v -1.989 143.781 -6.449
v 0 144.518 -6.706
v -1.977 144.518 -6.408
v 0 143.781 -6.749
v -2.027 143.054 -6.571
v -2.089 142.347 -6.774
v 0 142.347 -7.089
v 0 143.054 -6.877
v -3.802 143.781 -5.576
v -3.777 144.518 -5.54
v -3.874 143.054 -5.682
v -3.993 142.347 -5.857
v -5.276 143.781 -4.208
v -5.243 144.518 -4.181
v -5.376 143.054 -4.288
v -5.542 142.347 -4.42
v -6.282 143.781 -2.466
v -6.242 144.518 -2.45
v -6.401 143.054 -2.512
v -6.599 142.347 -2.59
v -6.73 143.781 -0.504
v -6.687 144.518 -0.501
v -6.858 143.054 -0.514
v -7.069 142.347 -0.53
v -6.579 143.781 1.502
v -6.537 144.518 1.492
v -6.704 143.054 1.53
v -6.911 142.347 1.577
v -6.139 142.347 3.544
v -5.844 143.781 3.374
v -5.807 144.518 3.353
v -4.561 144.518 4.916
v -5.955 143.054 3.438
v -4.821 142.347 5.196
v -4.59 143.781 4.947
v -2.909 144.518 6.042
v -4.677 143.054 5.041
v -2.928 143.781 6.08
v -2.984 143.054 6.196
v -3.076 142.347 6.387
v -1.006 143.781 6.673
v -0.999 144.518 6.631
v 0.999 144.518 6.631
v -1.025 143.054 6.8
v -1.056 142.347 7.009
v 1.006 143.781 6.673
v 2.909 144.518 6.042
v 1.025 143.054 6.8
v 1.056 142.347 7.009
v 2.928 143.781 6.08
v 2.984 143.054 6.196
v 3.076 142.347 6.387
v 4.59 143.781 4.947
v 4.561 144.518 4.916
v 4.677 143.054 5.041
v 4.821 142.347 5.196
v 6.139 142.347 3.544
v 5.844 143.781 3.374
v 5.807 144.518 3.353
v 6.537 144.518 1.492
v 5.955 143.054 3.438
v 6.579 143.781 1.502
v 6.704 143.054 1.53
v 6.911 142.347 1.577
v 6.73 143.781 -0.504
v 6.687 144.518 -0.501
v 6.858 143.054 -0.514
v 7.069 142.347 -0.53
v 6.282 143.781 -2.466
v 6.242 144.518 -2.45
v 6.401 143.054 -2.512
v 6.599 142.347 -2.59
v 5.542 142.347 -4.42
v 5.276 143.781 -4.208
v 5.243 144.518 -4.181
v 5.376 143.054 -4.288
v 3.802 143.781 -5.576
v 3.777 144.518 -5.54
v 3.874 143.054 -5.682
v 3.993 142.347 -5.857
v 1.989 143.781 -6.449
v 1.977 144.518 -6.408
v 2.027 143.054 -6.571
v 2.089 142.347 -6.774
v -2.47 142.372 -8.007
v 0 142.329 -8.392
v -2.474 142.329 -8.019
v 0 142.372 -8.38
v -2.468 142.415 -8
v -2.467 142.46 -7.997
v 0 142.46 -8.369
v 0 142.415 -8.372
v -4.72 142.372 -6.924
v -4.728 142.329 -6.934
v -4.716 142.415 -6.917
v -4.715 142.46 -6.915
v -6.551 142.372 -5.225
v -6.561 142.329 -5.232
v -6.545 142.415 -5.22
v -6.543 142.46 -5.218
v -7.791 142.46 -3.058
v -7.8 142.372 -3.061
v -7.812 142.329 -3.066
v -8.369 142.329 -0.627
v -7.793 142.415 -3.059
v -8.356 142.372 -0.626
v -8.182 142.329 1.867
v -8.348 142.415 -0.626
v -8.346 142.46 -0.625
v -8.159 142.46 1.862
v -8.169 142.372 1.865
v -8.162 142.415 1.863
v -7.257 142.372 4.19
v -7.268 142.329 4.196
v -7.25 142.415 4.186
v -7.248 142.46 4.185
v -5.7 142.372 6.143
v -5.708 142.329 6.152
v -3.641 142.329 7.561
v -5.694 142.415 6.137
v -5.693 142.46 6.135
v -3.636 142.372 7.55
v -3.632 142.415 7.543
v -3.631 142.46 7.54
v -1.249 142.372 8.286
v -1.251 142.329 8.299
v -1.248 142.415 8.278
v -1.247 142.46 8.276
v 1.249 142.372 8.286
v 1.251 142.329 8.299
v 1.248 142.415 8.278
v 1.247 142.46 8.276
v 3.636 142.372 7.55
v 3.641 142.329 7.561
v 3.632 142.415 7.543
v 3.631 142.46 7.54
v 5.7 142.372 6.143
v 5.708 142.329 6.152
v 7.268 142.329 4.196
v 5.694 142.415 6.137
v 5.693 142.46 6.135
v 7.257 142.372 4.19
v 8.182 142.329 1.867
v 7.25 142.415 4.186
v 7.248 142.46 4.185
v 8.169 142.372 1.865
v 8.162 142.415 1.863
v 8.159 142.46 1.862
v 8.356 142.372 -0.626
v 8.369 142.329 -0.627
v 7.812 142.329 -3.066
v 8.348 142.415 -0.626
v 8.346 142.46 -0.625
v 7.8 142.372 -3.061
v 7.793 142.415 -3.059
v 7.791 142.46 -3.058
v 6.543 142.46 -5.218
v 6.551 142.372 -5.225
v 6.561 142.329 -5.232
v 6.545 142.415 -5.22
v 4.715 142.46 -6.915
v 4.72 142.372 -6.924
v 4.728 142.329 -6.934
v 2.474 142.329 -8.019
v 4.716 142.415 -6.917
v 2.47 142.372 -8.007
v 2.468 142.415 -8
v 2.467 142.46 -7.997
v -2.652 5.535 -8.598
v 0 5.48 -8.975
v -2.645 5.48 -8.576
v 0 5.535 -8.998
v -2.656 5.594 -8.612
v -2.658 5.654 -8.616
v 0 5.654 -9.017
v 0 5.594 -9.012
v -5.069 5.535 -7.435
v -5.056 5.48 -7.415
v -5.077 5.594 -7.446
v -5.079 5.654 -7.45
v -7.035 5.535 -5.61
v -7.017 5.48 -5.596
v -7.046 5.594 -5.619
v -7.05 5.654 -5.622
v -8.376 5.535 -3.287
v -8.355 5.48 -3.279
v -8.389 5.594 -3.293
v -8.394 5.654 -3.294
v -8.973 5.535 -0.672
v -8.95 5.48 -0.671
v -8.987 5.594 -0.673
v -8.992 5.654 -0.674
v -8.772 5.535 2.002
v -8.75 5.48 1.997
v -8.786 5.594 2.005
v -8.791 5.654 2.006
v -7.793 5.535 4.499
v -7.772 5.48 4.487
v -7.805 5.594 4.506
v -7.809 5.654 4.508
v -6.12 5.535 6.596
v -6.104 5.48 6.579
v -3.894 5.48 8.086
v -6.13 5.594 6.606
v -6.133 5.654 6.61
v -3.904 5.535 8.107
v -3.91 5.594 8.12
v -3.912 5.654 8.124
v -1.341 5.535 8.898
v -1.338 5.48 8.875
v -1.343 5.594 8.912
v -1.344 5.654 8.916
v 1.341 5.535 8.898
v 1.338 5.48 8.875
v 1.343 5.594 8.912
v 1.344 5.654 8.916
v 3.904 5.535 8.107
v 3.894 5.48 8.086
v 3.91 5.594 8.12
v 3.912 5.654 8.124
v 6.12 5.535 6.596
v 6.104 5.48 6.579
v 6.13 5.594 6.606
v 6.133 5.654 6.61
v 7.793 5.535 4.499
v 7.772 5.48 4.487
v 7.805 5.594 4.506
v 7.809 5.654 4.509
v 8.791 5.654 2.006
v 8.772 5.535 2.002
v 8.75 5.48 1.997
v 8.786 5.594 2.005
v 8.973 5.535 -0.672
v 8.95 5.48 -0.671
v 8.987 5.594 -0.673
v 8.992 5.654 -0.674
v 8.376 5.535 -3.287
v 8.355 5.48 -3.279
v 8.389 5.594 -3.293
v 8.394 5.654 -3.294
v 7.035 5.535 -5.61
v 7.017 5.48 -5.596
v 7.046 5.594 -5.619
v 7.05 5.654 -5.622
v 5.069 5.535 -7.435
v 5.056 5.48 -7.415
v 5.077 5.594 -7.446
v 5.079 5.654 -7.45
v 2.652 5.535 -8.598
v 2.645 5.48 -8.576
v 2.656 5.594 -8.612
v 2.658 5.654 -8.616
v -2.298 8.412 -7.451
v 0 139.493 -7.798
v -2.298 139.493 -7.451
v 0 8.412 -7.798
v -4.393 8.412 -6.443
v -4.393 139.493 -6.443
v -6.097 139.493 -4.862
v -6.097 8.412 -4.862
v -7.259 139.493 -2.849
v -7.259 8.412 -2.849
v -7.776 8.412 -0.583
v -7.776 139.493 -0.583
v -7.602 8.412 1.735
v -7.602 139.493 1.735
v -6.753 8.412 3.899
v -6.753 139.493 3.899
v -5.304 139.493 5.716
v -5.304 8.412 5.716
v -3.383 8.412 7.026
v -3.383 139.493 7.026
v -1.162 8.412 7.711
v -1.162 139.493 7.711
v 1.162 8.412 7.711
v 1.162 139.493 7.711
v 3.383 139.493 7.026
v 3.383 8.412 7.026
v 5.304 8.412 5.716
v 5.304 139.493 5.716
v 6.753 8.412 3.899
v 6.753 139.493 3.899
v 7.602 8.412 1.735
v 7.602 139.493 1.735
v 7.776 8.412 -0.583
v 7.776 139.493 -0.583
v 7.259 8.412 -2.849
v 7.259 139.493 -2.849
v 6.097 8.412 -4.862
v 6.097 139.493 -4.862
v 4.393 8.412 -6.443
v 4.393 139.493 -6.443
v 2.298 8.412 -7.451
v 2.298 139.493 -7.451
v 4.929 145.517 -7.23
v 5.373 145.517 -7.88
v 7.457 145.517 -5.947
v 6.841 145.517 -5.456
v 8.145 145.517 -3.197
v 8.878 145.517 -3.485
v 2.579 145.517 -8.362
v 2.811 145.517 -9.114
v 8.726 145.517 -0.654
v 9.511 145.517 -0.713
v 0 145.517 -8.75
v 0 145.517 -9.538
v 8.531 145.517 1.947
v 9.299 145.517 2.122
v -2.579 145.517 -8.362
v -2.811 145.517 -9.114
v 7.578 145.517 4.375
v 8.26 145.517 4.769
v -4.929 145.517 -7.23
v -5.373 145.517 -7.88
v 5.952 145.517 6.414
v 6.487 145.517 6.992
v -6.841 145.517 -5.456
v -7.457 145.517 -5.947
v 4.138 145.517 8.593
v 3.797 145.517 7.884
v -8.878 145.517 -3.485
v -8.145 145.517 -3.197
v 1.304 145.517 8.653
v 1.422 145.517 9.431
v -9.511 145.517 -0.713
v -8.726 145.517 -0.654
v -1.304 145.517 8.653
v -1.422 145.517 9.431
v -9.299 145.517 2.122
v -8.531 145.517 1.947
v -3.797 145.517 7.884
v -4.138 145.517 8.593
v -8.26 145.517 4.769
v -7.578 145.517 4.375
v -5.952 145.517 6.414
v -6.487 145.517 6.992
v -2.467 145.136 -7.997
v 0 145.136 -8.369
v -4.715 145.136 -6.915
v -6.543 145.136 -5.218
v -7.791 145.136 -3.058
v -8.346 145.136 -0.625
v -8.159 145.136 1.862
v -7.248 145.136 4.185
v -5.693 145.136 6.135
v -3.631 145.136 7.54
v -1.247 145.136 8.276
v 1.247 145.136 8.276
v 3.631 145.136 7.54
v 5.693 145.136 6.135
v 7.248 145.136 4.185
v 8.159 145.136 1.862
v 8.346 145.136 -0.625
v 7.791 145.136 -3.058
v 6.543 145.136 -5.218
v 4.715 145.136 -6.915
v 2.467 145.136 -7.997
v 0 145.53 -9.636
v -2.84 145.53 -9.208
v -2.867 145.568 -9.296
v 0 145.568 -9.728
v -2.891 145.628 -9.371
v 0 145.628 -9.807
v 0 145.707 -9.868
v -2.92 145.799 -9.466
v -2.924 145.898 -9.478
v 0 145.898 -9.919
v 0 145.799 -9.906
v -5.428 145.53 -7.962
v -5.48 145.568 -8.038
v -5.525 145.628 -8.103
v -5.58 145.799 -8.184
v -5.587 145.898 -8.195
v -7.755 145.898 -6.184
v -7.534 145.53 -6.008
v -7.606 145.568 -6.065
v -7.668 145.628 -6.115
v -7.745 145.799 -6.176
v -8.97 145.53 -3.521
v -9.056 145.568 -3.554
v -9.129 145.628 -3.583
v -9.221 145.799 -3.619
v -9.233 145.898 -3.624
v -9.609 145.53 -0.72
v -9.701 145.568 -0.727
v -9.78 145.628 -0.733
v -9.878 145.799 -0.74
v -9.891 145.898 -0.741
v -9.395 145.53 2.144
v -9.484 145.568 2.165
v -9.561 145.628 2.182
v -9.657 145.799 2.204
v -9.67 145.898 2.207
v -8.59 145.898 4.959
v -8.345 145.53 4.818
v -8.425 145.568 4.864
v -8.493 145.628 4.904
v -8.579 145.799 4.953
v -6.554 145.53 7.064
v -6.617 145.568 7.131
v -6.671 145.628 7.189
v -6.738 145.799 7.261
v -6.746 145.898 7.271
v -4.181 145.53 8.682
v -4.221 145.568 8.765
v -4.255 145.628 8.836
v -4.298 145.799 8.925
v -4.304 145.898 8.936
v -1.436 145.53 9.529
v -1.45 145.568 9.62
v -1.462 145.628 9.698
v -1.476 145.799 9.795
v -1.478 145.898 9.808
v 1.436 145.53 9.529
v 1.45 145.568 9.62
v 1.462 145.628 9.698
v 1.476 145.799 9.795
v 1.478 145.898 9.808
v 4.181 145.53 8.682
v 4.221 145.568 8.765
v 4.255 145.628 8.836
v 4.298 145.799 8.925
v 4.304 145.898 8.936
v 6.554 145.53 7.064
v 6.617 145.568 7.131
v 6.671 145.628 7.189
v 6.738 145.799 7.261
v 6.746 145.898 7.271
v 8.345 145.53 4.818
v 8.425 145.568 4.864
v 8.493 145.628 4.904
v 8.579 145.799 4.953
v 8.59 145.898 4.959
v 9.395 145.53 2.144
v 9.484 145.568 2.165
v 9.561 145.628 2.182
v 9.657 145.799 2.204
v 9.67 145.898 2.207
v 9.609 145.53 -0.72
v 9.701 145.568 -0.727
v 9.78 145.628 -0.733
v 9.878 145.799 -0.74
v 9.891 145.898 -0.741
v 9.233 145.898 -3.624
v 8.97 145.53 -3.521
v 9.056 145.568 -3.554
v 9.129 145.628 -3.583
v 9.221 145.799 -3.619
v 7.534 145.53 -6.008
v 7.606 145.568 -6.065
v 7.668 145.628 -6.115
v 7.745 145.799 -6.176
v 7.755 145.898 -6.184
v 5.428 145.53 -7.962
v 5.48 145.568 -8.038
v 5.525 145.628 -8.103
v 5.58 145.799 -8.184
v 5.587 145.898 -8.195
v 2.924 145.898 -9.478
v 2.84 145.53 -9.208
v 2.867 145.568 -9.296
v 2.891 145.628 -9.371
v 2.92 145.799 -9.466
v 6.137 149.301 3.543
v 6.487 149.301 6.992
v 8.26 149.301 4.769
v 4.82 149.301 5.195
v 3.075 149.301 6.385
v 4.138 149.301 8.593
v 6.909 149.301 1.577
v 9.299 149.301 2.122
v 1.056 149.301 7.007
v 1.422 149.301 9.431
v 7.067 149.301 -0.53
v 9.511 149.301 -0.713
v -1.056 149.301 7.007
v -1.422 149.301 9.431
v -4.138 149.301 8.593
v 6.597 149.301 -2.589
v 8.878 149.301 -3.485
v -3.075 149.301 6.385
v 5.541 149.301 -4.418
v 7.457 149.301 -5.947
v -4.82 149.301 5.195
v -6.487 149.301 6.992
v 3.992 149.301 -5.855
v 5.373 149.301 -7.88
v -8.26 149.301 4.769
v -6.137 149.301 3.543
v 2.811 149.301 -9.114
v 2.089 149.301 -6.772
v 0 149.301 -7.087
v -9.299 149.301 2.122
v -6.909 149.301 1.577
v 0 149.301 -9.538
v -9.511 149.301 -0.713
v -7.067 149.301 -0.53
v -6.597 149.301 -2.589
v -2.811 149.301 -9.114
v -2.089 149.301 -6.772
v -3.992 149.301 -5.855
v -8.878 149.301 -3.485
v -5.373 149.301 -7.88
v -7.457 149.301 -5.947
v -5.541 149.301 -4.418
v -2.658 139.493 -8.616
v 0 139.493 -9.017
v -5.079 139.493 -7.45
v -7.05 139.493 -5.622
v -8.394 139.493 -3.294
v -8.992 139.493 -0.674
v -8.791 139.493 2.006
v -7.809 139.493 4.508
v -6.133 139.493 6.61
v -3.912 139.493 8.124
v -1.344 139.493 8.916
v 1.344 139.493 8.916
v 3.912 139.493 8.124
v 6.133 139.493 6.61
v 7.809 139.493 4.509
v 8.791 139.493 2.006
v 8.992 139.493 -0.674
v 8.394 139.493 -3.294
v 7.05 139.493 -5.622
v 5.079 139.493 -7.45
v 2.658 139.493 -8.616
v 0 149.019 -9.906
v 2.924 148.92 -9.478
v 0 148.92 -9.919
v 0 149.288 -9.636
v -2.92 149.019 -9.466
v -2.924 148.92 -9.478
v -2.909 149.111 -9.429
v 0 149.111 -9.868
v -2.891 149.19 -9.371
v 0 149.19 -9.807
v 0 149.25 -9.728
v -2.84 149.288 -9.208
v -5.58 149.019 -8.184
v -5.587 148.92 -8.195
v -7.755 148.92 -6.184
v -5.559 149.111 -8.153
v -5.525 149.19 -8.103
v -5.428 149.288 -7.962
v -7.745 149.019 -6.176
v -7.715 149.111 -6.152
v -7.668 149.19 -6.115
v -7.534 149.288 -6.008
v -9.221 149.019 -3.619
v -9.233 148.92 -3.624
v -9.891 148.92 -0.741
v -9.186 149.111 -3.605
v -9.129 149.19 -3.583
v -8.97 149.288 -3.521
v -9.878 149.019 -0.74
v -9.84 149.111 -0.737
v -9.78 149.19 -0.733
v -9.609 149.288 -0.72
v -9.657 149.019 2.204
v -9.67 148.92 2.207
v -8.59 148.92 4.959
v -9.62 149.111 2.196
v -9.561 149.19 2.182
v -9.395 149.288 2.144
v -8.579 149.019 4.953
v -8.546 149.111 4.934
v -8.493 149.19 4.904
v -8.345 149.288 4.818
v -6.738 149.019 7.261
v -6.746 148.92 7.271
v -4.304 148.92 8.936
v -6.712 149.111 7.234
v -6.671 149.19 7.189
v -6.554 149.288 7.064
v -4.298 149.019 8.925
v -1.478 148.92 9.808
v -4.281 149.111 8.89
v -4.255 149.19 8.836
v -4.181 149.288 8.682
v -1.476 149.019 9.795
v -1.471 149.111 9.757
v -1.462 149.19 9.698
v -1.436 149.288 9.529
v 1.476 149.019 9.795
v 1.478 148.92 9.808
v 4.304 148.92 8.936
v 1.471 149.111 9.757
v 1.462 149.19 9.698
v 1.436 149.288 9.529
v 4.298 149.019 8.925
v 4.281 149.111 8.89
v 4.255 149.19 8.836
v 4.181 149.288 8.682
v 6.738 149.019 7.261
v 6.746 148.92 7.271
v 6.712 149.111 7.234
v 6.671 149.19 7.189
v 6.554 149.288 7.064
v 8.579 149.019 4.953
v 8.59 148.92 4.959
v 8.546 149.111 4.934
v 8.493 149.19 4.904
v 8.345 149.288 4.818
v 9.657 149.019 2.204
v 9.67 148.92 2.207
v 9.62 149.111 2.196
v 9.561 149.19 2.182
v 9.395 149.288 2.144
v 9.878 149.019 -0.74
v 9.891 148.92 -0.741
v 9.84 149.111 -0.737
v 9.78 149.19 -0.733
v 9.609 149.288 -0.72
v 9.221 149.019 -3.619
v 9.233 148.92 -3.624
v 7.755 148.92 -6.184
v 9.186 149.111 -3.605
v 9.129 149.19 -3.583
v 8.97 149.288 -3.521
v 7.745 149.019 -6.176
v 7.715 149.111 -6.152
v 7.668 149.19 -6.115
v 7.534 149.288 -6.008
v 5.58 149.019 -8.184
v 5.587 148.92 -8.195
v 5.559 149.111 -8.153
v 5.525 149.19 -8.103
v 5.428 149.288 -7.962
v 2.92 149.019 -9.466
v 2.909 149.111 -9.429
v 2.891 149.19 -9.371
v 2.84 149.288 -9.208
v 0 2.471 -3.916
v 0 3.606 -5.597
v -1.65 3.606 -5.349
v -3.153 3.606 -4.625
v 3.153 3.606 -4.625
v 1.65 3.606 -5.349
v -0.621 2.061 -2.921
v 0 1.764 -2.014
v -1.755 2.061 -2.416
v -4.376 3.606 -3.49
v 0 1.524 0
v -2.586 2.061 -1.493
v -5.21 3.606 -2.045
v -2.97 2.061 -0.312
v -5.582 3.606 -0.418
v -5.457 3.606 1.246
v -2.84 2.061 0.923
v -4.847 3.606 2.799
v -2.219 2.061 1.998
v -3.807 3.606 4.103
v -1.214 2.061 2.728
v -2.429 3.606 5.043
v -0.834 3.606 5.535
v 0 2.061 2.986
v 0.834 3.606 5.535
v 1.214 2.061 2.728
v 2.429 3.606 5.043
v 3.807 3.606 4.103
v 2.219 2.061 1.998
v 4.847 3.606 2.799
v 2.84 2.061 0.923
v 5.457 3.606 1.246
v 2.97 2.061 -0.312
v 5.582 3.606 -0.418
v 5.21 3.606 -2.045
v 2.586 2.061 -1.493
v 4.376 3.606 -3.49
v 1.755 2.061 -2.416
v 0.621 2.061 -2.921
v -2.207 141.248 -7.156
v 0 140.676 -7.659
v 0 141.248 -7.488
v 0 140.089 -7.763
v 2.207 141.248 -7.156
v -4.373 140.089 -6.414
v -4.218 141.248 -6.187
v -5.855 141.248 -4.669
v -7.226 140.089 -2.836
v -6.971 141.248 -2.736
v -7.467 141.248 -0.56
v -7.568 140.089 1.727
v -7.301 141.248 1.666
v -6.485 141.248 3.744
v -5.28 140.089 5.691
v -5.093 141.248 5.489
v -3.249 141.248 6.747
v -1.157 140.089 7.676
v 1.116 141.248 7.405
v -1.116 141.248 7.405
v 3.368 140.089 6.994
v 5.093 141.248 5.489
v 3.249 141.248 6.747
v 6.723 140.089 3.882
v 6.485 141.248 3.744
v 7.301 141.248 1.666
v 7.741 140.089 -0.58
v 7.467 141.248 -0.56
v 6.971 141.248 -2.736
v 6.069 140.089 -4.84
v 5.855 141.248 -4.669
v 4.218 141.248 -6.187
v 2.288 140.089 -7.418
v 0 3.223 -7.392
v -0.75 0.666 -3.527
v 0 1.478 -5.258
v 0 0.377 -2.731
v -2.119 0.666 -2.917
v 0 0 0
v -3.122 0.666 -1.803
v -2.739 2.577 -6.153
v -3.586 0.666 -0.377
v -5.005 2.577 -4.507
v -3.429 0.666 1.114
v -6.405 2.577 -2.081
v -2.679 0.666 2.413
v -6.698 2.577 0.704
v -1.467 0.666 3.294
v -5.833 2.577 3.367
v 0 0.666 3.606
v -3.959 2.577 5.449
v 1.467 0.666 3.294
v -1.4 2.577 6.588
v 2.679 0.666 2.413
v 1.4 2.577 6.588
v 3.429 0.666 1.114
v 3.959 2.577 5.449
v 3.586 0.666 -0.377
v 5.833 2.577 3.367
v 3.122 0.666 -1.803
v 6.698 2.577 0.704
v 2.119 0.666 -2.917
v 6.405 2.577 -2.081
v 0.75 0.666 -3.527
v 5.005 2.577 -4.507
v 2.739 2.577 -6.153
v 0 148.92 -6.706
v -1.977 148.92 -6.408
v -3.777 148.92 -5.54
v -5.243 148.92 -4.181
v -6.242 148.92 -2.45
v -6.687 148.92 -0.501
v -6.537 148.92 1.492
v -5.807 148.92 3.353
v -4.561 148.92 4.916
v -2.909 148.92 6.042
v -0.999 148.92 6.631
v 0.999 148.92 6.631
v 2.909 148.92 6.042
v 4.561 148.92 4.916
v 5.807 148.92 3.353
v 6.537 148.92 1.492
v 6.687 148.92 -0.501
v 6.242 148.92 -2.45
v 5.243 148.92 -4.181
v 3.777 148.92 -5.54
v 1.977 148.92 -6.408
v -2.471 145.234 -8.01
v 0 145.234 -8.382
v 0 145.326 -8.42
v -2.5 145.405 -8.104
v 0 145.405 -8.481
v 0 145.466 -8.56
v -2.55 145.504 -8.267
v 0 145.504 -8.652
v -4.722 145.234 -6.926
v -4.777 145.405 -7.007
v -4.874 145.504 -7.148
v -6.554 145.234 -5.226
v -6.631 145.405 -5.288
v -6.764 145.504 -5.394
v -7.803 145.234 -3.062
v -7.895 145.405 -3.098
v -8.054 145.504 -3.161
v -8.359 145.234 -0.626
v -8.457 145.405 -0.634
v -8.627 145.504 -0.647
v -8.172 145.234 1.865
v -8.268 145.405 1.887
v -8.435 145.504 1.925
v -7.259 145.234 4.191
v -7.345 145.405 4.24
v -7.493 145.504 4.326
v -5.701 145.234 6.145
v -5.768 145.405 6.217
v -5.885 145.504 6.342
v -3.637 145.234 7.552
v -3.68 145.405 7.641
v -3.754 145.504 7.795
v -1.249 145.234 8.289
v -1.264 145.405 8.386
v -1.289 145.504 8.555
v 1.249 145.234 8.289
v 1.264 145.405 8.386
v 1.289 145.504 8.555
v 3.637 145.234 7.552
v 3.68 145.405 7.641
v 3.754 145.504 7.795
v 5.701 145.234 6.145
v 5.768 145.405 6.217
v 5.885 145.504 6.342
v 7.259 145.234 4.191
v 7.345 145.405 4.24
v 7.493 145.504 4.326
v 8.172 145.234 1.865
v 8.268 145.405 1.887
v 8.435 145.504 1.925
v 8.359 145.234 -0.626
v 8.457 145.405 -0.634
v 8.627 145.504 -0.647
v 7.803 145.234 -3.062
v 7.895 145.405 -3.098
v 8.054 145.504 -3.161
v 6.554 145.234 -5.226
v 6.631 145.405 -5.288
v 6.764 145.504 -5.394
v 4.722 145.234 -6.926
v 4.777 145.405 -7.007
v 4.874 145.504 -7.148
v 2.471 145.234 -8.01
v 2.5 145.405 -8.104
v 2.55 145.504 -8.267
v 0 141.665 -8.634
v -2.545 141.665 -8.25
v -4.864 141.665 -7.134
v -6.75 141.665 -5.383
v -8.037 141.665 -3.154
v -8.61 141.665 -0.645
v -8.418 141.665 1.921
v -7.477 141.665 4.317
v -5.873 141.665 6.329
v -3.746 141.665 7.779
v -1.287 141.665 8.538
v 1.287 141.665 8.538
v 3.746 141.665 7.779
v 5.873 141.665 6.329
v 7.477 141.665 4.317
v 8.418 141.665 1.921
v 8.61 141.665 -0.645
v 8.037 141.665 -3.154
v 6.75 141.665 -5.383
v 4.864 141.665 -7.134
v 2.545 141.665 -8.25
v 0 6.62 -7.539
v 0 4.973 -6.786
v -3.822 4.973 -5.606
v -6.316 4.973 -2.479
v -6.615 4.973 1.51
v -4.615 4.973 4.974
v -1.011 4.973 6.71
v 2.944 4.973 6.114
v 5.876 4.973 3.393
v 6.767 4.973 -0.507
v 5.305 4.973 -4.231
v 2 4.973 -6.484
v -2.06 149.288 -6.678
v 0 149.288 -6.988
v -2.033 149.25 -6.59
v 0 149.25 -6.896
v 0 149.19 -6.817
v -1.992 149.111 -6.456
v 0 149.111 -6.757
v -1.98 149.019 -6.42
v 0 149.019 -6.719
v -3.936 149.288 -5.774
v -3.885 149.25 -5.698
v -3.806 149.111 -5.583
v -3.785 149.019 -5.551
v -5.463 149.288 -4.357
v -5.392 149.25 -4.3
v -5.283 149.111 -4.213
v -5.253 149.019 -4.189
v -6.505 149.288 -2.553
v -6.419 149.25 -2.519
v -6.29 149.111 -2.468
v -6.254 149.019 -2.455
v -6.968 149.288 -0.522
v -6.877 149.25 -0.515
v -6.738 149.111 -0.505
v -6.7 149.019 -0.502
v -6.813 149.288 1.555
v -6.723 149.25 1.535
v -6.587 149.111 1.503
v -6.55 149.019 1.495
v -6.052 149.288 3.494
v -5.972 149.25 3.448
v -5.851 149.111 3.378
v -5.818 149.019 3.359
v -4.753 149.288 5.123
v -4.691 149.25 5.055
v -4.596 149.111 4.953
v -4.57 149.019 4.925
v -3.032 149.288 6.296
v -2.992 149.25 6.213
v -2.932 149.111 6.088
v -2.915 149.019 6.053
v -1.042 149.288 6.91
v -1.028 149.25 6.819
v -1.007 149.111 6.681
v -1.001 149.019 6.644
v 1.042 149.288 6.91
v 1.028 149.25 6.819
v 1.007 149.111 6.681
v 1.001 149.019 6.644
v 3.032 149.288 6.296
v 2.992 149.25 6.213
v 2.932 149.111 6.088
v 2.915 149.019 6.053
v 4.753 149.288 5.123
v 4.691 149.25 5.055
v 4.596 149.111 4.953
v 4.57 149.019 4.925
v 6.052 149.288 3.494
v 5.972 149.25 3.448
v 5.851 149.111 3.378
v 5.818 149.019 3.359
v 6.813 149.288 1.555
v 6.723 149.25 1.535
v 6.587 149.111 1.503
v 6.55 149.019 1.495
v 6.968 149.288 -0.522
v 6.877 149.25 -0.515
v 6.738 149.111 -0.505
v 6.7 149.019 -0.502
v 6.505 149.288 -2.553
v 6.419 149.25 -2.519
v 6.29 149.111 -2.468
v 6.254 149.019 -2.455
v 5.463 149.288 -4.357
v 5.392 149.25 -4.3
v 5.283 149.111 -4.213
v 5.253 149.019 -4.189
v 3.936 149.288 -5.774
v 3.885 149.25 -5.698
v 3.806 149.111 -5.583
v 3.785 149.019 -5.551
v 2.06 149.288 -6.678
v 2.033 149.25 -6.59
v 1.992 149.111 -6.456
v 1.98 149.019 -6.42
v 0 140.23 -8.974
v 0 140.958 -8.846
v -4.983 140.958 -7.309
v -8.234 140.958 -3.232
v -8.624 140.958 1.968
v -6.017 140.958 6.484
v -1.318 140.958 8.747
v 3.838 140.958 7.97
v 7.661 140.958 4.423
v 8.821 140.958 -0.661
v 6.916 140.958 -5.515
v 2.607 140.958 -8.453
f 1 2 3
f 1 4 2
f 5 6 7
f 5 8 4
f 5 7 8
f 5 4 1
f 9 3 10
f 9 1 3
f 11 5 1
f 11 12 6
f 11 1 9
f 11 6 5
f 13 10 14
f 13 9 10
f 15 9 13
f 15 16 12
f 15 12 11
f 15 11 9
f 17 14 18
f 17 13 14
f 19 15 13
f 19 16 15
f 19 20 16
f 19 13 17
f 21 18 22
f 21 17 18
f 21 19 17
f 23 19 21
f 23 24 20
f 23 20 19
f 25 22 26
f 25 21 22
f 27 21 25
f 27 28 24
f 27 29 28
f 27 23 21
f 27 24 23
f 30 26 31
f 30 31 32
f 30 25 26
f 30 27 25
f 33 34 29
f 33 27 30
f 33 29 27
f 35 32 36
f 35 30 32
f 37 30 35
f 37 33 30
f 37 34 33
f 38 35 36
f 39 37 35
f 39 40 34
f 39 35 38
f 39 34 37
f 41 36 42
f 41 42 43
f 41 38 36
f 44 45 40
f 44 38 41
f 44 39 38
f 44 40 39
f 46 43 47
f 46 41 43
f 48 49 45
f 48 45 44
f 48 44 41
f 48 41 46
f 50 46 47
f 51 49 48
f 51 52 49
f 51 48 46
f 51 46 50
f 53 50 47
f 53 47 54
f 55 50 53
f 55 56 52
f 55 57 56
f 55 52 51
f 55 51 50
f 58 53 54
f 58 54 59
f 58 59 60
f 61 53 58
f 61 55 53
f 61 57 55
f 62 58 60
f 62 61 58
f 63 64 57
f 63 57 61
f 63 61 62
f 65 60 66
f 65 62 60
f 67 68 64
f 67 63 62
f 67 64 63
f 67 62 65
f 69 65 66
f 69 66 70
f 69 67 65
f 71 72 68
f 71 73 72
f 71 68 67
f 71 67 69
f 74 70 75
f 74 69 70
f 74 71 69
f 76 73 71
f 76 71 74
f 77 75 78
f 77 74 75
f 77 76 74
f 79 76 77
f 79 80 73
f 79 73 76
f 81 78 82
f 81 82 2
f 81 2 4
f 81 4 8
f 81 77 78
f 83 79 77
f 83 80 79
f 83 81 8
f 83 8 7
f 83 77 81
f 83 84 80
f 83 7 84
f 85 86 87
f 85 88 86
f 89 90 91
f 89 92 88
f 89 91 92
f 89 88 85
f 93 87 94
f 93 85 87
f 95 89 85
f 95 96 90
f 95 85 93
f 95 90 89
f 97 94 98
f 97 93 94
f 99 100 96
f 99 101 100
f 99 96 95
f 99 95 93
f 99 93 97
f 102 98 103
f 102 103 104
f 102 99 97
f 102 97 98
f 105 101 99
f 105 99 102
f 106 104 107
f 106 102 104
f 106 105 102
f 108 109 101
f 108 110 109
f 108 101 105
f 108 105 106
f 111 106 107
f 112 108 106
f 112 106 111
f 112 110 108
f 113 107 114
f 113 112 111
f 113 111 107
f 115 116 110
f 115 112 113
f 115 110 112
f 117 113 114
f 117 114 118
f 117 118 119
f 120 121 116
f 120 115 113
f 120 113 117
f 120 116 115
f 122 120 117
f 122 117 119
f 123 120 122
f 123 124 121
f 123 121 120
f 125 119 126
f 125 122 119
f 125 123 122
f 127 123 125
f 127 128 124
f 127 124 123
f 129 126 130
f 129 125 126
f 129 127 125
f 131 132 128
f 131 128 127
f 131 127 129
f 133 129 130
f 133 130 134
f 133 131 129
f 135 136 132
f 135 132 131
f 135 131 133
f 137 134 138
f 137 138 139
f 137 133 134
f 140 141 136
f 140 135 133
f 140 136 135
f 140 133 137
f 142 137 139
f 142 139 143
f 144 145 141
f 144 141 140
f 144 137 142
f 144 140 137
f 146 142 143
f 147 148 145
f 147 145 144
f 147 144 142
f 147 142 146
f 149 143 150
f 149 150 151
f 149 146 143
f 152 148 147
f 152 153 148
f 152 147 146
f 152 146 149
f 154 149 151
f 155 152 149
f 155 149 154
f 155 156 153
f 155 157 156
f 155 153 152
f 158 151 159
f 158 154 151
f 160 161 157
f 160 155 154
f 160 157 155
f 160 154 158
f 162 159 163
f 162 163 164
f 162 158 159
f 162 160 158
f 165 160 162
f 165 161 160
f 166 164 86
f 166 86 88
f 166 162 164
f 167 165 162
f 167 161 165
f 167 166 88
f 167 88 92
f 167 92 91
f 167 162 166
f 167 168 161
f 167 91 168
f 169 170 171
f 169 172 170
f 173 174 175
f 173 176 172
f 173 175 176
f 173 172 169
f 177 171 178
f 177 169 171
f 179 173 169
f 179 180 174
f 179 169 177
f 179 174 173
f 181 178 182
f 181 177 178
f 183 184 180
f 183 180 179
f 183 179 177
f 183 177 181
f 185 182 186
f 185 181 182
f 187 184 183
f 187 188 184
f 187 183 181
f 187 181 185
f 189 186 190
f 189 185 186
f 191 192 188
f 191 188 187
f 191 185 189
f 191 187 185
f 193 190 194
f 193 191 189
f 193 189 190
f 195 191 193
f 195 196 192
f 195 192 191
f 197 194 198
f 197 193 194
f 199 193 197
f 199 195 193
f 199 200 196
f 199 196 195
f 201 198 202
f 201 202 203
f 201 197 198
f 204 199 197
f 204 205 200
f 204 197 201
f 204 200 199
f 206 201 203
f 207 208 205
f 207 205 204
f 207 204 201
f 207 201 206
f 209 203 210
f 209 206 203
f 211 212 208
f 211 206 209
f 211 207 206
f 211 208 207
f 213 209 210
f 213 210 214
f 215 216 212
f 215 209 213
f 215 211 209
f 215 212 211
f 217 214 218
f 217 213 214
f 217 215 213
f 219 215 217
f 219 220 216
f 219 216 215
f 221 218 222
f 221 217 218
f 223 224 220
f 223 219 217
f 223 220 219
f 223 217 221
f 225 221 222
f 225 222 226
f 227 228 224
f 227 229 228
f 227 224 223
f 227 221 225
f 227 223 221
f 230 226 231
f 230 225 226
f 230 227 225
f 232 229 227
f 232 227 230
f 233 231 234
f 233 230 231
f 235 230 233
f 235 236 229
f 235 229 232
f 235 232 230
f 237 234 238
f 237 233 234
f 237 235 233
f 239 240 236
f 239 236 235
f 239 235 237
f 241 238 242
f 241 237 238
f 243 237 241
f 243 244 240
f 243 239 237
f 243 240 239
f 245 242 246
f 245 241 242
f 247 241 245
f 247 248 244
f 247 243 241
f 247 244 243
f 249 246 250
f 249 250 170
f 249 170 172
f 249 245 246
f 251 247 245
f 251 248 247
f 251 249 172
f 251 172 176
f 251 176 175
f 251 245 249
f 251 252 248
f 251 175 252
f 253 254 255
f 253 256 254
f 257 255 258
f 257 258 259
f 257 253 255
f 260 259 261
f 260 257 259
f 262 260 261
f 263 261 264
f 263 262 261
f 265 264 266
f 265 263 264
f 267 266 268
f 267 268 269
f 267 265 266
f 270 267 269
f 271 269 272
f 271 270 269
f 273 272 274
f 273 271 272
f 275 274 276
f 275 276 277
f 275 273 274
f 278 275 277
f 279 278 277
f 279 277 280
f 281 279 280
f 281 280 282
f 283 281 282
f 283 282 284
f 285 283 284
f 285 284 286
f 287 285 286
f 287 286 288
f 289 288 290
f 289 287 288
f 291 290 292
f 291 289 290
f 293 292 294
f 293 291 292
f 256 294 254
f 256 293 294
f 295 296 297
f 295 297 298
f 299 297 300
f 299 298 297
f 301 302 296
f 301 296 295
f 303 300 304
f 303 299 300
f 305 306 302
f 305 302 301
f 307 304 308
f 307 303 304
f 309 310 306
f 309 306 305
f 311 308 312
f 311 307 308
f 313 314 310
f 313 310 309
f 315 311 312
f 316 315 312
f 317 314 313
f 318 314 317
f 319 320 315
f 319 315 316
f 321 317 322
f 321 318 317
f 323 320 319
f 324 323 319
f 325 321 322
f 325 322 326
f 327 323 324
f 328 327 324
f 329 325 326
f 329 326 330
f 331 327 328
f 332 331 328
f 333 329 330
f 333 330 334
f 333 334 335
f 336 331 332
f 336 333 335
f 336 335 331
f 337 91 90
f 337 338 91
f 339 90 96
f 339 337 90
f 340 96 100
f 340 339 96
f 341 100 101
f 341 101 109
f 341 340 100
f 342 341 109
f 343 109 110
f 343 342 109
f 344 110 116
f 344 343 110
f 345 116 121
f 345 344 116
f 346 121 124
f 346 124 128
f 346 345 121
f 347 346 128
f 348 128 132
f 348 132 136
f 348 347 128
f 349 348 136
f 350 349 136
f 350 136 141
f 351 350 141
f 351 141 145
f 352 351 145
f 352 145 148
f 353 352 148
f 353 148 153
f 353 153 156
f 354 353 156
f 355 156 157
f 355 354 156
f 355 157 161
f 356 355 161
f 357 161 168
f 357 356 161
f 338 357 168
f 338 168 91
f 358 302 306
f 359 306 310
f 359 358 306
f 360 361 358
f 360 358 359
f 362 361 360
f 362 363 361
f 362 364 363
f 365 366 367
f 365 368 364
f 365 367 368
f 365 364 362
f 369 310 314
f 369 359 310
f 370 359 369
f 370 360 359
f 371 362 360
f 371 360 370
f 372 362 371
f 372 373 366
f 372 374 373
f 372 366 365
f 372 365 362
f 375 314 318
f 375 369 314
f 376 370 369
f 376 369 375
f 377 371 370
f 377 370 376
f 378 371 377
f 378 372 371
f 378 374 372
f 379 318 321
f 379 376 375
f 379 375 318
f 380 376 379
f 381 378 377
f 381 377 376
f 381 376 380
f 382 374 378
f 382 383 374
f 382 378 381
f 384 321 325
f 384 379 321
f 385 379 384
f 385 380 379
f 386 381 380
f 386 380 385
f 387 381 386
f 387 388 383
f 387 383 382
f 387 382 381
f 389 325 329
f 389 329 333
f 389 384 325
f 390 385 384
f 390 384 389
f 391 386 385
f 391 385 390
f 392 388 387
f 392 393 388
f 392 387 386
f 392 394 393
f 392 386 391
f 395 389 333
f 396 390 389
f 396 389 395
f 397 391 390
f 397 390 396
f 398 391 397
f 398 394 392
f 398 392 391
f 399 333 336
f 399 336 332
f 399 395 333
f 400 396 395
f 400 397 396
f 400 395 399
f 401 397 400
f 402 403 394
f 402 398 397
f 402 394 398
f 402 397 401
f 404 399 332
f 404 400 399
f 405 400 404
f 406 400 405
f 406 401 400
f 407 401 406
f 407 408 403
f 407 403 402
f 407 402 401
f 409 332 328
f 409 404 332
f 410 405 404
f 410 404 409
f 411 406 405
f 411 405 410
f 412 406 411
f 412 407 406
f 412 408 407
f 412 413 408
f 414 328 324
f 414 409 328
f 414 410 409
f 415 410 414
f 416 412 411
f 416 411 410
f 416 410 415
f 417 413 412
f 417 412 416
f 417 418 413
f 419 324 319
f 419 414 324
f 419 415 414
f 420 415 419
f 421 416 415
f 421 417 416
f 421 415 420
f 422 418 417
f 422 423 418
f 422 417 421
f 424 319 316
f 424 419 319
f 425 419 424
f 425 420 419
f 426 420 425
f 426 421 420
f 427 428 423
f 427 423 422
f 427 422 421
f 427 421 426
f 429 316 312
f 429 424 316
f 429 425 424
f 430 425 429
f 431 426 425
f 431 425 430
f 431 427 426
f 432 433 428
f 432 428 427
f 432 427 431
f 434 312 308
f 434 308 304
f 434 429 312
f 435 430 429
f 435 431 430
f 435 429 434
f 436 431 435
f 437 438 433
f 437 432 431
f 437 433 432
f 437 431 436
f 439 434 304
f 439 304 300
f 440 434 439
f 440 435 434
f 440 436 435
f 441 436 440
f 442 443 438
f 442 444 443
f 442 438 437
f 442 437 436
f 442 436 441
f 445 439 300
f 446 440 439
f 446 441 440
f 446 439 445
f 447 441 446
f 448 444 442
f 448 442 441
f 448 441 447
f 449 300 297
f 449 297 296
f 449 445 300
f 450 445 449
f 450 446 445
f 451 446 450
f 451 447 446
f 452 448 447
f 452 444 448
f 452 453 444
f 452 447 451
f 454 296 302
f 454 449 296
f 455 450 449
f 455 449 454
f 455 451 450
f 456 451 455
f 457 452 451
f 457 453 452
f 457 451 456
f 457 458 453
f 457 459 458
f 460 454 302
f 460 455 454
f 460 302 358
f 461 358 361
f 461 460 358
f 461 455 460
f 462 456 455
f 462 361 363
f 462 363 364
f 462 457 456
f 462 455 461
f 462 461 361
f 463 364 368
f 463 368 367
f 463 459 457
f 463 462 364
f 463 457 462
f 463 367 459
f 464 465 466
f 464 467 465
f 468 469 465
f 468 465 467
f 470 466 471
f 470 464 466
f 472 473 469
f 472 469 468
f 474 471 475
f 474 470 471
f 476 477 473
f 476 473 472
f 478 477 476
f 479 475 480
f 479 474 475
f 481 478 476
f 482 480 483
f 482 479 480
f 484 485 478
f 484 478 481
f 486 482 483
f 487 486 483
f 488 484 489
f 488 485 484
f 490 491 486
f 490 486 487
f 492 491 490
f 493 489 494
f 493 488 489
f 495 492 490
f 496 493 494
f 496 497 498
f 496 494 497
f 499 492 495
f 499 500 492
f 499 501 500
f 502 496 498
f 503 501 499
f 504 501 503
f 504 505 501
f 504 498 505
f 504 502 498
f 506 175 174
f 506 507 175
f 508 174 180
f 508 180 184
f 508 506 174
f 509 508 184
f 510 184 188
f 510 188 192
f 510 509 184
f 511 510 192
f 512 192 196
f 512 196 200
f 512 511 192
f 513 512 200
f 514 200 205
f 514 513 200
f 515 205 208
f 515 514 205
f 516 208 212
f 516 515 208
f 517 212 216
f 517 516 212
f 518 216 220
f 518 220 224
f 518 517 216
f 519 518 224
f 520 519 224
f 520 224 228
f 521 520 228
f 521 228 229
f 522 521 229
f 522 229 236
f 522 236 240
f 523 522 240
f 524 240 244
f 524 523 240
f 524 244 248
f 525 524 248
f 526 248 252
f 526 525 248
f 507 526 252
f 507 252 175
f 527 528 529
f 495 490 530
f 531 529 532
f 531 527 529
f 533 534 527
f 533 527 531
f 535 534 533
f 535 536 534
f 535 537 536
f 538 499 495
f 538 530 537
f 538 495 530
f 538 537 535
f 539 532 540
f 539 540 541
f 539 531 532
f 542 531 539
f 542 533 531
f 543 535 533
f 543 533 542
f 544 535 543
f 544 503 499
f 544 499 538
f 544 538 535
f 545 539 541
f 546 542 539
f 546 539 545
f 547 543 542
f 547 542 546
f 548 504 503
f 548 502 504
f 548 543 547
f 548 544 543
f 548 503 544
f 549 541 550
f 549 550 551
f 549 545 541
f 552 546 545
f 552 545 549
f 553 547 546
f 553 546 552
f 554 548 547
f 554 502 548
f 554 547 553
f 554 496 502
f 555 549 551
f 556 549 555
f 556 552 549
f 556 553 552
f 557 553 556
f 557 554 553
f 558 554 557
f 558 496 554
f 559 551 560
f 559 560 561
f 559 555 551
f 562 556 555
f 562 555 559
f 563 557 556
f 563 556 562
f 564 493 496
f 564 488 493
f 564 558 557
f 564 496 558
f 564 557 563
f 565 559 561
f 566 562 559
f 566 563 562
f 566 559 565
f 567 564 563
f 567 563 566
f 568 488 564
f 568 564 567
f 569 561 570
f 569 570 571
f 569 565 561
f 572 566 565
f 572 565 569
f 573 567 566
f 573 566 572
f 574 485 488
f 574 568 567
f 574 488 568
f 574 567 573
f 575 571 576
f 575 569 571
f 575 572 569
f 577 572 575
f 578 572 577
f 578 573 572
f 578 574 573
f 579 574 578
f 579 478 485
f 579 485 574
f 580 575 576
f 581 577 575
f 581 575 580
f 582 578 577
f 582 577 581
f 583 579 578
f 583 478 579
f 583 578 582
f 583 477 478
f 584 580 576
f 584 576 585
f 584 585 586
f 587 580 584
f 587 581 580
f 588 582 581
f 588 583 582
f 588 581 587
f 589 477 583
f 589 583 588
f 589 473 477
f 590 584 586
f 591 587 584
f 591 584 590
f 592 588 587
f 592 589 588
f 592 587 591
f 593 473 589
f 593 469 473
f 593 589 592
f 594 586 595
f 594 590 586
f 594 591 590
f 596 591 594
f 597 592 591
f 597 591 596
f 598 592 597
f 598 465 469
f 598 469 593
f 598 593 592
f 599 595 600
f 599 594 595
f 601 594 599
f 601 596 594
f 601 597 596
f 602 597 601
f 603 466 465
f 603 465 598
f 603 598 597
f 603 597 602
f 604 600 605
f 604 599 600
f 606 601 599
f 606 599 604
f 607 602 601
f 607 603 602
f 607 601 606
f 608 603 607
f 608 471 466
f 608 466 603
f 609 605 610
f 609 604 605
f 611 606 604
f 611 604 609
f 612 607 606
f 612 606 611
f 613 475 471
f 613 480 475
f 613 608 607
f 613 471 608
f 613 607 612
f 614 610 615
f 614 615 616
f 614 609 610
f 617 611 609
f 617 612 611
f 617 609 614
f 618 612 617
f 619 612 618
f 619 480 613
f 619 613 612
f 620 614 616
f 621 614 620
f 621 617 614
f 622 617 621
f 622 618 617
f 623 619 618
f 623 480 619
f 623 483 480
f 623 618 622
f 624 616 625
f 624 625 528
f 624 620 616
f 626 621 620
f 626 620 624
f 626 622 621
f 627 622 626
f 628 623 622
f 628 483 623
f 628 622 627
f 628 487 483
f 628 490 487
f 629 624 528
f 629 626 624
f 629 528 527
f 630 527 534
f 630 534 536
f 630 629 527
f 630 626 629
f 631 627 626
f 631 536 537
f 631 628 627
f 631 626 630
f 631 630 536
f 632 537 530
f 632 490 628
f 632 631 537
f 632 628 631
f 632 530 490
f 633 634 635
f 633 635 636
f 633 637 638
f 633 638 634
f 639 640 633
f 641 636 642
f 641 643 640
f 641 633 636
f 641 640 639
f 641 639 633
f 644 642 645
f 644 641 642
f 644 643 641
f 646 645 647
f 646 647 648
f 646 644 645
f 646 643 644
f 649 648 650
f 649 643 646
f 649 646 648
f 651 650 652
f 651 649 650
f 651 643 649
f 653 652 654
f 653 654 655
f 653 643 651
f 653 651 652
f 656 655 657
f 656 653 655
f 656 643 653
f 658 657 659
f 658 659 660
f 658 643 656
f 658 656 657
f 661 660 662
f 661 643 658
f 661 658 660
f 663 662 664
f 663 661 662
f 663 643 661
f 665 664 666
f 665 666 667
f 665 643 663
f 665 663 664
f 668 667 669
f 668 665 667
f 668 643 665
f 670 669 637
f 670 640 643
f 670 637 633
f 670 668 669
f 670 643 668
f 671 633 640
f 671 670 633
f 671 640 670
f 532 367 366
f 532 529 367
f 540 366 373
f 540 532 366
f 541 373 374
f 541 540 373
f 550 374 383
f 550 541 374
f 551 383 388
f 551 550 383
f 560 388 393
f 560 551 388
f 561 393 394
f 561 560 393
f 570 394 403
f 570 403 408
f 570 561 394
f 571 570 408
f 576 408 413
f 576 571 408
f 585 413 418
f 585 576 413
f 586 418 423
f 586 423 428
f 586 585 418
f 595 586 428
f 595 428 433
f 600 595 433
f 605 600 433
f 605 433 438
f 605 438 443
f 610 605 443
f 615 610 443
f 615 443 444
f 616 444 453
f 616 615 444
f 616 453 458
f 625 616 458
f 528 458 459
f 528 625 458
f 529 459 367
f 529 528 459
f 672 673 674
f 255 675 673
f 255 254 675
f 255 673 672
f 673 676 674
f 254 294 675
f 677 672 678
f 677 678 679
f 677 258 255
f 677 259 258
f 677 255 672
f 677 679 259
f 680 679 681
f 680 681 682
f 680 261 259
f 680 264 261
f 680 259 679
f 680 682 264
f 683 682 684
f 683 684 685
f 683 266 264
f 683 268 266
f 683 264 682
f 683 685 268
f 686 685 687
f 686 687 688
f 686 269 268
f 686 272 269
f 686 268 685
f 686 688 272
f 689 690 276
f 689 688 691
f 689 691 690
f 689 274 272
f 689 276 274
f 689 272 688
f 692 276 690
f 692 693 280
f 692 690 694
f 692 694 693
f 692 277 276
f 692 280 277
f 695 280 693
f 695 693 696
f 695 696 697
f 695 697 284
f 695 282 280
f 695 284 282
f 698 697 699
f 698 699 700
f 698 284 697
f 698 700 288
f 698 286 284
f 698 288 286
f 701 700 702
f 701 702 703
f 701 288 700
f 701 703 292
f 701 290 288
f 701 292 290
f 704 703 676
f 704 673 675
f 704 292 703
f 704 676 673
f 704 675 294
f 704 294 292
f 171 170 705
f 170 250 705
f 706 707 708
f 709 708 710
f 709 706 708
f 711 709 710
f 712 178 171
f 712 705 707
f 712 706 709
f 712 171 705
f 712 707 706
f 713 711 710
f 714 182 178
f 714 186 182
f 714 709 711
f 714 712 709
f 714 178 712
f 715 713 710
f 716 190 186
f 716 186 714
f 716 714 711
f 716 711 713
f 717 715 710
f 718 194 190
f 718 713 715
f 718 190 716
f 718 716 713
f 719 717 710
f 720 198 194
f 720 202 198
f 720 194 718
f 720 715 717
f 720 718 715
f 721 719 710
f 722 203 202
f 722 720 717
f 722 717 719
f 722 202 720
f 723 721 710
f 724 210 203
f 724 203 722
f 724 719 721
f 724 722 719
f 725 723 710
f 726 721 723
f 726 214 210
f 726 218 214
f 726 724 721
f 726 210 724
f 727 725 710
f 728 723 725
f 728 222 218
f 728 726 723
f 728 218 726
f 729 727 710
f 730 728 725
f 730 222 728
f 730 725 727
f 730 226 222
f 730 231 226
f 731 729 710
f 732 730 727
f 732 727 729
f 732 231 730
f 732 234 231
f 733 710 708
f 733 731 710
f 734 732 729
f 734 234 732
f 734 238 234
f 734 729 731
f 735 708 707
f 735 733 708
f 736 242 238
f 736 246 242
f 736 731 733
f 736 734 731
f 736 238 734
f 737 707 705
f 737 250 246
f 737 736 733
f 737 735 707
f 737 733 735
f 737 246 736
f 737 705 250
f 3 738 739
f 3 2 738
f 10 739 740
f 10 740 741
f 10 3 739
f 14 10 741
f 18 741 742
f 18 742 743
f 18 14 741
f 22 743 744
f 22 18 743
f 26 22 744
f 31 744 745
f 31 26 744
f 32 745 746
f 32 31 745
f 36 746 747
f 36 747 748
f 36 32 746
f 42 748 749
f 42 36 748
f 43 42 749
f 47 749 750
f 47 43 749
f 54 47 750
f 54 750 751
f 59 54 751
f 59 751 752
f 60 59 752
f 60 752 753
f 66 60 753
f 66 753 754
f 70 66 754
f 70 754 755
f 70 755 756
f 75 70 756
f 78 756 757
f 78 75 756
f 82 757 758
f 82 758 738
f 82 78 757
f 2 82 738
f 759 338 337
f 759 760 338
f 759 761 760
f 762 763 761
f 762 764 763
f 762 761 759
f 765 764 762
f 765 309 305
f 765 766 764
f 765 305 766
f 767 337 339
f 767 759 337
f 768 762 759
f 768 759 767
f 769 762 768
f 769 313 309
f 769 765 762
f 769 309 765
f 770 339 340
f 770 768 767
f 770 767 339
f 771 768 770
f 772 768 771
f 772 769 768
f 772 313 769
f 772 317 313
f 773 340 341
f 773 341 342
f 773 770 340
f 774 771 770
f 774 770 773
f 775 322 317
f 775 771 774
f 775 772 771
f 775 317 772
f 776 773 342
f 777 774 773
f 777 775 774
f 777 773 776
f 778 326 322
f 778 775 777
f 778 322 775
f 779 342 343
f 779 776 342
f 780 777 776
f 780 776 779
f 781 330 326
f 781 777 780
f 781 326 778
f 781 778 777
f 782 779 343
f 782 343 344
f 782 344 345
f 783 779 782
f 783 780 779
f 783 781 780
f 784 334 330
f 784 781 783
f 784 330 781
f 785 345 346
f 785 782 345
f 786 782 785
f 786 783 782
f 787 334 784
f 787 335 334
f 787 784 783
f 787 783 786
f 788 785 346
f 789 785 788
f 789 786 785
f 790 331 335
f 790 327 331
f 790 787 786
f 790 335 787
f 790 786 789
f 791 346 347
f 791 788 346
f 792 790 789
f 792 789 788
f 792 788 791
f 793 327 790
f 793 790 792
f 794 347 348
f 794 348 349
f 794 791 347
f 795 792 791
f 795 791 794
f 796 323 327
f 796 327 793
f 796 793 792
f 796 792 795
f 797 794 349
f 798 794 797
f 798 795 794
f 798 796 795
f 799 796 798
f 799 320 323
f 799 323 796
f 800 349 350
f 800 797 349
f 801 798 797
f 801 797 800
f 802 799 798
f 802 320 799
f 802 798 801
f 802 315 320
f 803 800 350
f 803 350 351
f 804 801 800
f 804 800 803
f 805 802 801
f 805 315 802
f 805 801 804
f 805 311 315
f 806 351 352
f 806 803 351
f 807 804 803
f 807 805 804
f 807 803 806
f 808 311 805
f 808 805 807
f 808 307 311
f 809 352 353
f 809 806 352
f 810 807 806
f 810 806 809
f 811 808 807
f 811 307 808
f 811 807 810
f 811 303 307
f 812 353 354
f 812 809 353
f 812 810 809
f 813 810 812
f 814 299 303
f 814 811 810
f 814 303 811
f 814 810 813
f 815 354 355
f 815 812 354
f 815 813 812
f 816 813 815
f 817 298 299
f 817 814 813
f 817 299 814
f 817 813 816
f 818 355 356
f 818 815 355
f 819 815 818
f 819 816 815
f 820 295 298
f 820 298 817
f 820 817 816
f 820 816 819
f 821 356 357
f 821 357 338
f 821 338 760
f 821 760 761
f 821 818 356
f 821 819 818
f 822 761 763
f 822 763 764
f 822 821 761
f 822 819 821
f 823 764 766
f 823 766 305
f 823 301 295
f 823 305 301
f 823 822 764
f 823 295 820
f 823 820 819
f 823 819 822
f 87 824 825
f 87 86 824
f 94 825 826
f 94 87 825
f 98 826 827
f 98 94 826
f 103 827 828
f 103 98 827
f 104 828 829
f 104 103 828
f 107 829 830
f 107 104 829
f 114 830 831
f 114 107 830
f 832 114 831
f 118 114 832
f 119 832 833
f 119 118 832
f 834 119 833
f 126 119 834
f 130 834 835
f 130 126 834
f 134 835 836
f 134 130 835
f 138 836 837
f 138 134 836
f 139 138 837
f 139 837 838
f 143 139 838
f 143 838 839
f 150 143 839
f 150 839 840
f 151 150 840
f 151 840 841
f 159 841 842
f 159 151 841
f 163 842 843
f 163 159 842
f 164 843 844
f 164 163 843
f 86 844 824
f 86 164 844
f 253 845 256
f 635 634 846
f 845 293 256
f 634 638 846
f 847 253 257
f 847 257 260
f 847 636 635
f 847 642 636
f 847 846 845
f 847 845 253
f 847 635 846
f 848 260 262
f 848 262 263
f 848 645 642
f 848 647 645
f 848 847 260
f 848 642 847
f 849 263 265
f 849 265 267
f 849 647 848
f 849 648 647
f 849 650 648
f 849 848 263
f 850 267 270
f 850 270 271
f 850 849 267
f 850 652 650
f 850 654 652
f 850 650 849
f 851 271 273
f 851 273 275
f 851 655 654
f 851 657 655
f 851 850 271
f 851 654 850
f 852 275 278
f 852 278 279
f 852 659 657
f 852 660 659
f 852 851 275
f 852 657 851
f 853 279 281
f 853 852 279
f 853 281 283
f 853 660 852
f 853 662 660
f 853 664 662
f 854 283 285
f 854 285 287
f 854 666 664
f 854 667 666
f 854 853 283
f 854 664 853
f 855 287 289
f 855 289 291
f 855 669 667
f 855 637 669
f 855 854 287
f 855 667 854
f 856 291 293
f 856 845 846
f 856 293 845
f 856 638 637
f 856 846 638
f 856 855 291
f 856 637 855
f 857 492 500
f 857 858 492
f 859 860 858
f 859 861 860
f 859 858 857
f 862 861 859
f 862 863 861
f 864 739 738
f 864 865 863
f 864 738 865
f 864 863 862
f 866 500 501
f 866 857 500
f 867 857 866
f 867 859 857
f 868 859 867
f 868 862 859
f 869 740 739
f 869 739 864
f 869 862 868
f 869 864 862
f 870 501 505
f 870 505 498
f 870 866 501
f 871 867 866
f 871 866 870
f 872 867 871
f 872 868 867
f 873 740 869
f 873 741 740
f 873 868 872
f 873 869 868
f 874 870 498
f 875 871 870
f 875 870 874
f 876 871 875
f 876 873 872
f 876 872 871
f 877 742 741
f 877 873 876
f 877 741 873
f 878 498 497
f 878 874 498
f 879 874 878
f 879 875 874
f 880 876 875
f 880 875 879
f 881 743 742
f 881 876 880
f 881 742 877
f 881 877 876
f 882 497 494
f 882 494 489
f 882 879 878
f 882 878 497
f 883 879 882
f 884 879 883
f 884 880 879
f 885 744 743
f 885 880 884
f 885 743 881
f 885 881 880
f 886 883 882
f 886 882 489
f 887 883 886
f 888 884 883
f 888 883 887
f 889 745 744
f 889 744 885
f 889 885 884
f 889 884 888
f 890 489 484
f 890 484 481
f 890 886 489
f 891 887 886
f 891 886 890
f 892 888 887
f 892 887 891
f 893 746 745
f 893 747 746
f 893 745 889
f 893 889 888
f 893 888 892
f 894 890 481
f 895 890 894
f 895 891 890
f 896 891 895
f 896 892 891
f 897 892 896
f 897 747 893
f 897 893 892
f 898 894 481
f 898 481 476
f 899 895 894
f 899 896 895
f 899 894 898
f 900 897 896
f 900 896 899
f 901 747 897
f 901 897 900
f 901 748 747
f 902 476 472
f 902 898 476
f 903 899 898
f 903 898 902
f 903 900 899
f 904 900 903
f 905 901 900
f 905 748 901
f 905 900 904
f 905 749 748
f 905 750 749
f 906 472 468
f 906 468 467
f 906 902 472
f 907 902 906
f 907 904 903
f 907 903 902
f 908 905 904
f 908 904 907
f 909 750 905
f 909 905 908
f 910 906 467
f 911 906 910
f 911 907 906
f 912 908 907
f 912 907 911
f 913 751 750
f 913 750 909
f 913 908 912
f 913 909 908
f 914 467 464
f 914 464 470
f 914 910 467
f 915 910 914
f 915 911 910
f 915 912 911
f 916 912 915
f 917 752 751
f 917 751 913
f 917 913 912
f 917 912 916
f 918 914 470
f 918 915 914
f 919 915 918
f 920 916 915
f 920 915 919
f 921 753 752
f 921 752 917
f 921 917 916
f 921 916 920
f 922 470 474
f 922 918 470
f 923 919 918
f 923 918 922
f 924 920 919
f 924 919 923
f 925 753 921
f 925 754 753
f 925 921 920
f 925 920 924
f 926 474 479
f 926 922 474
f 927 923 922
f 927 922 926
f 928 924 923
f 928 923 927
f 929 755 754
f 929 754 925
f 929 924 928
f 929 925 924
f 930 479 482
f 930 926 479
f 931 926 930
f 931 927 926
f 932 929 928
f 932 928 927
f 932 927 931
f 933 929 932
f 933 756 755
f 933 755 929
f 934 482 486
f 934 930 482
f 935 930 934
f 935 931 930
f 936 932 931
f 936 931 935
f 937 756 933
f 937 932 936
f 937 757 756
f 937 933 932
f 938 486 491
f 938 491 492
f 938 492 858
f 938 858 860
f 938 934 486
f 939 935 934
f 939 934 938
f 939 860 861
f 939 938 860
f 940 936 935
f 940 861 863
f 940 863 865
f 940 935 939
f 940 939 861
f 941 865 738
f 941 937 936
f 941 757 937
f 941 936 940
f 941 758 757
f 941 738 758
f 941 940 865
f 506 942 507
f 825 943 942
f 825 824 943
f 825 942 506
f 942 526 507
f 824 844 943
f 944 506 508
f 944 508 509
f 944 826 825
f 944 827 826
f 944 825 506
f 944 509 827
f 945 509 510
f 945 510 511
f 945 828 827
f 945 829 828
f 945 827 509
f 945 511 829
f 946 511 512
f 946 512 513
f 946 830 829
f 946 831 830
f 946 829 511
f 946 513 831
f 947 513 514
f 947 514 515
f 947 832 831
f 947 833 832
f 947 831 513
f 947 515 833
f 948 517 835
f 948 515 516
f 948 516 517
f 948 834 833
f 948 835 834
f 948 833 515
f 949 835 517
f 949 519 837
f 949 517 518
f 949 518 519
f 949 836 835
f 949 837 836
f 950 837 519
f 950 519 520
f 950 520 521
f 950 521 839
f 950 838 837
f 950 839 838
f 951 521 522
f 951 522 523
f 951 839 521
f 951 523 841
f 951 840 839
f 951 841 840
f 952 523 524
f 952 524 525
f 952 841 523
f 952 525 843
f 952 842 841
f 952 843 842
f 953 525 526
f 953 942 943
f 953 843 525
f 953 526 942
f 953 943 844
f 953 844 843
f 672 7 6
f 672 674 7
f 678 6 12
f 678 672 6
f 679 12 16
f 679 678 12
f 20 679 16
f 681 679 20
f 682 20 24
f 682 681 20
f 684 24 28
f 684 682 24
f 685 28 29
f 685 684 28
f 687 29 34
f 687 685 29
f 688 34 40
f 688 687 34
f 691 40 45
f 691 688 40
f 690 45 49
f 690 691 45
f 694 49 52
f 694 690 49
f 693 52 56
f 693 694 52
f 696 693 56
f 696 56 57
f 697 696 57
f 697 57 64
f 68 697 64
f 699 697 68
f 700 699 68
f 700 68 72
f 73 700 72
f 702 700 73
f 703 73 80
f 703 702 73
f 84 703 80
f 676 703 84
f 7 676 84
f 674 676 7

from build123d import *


with BuildPart() as part:
    # Sketch1 → Revolve1 (revolve)
    with BuildSketch(Plane.XY, mode=Mode.PRIVATE) as revolve1_sk:
        with BuildLine():
            Line((-9.017, 5.653790228), (-9.017, 139.493182548))
            ThreePointArc((-9.017, 139.493182548), (-8.920529232, 140.595848476), (-8.634048142, 141.665010458))
            Line((-8.634048142, 141.665010458), (-8.392277111, 142.329270905))
            ThreePointArc((-8.392277111, 142.329270905), (-8.375088246, 142.393420624), (-8.3693, 142.45958058))
            Line((-8.3693, 142.45958058), (-8.3693, 145.1356))
            ThreePointArc((-8.3693, 145.1356), (-8.480892316, 145.405007684), (-8.7503, 145.5166))
            Line((-8.7503, 145.5166), (-9.5377, 145.5166))
            ThreePointArc((-9.5377, 145.5166), (-9.807107684, 145.628192316), (-9.9187, 145.8976))
            Line((-9.9187, 145.8976), (-9.9187, 148.9202))
            ThreePointArc((-9.9187, 148.9202), (-9.807107684, 149.189607684), (-9.5377, 149.3012))
            Line((-9.5377, 149.3012), (-7.0866, 149.3012))
            ThreePointArc((-7.0866, 149.3012), (-6.817192316, 149.189607684), (-6.7056, 148.9202))
            Line((-6.7056, 148.9202), (-6.7056, 144.518352186))
            ThreePointArc((-6.7056, 144.518352186), (-6.802070768, 143.415686257), (-7.088551858, 142.346524275))
            Line((-7.088551858, 142.346524275), (-7.488374899, 141.248019499))
            ThreePointArc((-7.488374899, 141.248019499), (-7.719851619, 140.384136618), (-7.7978, 139.493182548))
            Line((-7.7978, 139.493182548), (-7.7978, 8.412472236))
            ThreePointArc((-7.7978, 8.412472236), (-7.221513837, 5.769230188), (-5.597255583, 3.605756271))
            ThreePointArc((-5.597255583, 3.605756271), (-2.985924448, 2.061290242), (0, 1.524))
            Line((0, 1.524), (0, 0))
            ThreePointArc((0, 0), (-5.257761417, 1.478213913), (-8.974907392, 5.479713293))
            ThreePointArc((-8.974907392, 5.479713293), (-9.006327366, 5.564243359), (-9.017, 5.653790228))
        make_face()
    revolve(revolve1_sk.sketch.rotate(Axis((0, -45.560251793, 0), (0, 1, 0)), 270), axis=Axis((0, -45.560251793, 0), (0, 1, 0)))


solid = part.part
